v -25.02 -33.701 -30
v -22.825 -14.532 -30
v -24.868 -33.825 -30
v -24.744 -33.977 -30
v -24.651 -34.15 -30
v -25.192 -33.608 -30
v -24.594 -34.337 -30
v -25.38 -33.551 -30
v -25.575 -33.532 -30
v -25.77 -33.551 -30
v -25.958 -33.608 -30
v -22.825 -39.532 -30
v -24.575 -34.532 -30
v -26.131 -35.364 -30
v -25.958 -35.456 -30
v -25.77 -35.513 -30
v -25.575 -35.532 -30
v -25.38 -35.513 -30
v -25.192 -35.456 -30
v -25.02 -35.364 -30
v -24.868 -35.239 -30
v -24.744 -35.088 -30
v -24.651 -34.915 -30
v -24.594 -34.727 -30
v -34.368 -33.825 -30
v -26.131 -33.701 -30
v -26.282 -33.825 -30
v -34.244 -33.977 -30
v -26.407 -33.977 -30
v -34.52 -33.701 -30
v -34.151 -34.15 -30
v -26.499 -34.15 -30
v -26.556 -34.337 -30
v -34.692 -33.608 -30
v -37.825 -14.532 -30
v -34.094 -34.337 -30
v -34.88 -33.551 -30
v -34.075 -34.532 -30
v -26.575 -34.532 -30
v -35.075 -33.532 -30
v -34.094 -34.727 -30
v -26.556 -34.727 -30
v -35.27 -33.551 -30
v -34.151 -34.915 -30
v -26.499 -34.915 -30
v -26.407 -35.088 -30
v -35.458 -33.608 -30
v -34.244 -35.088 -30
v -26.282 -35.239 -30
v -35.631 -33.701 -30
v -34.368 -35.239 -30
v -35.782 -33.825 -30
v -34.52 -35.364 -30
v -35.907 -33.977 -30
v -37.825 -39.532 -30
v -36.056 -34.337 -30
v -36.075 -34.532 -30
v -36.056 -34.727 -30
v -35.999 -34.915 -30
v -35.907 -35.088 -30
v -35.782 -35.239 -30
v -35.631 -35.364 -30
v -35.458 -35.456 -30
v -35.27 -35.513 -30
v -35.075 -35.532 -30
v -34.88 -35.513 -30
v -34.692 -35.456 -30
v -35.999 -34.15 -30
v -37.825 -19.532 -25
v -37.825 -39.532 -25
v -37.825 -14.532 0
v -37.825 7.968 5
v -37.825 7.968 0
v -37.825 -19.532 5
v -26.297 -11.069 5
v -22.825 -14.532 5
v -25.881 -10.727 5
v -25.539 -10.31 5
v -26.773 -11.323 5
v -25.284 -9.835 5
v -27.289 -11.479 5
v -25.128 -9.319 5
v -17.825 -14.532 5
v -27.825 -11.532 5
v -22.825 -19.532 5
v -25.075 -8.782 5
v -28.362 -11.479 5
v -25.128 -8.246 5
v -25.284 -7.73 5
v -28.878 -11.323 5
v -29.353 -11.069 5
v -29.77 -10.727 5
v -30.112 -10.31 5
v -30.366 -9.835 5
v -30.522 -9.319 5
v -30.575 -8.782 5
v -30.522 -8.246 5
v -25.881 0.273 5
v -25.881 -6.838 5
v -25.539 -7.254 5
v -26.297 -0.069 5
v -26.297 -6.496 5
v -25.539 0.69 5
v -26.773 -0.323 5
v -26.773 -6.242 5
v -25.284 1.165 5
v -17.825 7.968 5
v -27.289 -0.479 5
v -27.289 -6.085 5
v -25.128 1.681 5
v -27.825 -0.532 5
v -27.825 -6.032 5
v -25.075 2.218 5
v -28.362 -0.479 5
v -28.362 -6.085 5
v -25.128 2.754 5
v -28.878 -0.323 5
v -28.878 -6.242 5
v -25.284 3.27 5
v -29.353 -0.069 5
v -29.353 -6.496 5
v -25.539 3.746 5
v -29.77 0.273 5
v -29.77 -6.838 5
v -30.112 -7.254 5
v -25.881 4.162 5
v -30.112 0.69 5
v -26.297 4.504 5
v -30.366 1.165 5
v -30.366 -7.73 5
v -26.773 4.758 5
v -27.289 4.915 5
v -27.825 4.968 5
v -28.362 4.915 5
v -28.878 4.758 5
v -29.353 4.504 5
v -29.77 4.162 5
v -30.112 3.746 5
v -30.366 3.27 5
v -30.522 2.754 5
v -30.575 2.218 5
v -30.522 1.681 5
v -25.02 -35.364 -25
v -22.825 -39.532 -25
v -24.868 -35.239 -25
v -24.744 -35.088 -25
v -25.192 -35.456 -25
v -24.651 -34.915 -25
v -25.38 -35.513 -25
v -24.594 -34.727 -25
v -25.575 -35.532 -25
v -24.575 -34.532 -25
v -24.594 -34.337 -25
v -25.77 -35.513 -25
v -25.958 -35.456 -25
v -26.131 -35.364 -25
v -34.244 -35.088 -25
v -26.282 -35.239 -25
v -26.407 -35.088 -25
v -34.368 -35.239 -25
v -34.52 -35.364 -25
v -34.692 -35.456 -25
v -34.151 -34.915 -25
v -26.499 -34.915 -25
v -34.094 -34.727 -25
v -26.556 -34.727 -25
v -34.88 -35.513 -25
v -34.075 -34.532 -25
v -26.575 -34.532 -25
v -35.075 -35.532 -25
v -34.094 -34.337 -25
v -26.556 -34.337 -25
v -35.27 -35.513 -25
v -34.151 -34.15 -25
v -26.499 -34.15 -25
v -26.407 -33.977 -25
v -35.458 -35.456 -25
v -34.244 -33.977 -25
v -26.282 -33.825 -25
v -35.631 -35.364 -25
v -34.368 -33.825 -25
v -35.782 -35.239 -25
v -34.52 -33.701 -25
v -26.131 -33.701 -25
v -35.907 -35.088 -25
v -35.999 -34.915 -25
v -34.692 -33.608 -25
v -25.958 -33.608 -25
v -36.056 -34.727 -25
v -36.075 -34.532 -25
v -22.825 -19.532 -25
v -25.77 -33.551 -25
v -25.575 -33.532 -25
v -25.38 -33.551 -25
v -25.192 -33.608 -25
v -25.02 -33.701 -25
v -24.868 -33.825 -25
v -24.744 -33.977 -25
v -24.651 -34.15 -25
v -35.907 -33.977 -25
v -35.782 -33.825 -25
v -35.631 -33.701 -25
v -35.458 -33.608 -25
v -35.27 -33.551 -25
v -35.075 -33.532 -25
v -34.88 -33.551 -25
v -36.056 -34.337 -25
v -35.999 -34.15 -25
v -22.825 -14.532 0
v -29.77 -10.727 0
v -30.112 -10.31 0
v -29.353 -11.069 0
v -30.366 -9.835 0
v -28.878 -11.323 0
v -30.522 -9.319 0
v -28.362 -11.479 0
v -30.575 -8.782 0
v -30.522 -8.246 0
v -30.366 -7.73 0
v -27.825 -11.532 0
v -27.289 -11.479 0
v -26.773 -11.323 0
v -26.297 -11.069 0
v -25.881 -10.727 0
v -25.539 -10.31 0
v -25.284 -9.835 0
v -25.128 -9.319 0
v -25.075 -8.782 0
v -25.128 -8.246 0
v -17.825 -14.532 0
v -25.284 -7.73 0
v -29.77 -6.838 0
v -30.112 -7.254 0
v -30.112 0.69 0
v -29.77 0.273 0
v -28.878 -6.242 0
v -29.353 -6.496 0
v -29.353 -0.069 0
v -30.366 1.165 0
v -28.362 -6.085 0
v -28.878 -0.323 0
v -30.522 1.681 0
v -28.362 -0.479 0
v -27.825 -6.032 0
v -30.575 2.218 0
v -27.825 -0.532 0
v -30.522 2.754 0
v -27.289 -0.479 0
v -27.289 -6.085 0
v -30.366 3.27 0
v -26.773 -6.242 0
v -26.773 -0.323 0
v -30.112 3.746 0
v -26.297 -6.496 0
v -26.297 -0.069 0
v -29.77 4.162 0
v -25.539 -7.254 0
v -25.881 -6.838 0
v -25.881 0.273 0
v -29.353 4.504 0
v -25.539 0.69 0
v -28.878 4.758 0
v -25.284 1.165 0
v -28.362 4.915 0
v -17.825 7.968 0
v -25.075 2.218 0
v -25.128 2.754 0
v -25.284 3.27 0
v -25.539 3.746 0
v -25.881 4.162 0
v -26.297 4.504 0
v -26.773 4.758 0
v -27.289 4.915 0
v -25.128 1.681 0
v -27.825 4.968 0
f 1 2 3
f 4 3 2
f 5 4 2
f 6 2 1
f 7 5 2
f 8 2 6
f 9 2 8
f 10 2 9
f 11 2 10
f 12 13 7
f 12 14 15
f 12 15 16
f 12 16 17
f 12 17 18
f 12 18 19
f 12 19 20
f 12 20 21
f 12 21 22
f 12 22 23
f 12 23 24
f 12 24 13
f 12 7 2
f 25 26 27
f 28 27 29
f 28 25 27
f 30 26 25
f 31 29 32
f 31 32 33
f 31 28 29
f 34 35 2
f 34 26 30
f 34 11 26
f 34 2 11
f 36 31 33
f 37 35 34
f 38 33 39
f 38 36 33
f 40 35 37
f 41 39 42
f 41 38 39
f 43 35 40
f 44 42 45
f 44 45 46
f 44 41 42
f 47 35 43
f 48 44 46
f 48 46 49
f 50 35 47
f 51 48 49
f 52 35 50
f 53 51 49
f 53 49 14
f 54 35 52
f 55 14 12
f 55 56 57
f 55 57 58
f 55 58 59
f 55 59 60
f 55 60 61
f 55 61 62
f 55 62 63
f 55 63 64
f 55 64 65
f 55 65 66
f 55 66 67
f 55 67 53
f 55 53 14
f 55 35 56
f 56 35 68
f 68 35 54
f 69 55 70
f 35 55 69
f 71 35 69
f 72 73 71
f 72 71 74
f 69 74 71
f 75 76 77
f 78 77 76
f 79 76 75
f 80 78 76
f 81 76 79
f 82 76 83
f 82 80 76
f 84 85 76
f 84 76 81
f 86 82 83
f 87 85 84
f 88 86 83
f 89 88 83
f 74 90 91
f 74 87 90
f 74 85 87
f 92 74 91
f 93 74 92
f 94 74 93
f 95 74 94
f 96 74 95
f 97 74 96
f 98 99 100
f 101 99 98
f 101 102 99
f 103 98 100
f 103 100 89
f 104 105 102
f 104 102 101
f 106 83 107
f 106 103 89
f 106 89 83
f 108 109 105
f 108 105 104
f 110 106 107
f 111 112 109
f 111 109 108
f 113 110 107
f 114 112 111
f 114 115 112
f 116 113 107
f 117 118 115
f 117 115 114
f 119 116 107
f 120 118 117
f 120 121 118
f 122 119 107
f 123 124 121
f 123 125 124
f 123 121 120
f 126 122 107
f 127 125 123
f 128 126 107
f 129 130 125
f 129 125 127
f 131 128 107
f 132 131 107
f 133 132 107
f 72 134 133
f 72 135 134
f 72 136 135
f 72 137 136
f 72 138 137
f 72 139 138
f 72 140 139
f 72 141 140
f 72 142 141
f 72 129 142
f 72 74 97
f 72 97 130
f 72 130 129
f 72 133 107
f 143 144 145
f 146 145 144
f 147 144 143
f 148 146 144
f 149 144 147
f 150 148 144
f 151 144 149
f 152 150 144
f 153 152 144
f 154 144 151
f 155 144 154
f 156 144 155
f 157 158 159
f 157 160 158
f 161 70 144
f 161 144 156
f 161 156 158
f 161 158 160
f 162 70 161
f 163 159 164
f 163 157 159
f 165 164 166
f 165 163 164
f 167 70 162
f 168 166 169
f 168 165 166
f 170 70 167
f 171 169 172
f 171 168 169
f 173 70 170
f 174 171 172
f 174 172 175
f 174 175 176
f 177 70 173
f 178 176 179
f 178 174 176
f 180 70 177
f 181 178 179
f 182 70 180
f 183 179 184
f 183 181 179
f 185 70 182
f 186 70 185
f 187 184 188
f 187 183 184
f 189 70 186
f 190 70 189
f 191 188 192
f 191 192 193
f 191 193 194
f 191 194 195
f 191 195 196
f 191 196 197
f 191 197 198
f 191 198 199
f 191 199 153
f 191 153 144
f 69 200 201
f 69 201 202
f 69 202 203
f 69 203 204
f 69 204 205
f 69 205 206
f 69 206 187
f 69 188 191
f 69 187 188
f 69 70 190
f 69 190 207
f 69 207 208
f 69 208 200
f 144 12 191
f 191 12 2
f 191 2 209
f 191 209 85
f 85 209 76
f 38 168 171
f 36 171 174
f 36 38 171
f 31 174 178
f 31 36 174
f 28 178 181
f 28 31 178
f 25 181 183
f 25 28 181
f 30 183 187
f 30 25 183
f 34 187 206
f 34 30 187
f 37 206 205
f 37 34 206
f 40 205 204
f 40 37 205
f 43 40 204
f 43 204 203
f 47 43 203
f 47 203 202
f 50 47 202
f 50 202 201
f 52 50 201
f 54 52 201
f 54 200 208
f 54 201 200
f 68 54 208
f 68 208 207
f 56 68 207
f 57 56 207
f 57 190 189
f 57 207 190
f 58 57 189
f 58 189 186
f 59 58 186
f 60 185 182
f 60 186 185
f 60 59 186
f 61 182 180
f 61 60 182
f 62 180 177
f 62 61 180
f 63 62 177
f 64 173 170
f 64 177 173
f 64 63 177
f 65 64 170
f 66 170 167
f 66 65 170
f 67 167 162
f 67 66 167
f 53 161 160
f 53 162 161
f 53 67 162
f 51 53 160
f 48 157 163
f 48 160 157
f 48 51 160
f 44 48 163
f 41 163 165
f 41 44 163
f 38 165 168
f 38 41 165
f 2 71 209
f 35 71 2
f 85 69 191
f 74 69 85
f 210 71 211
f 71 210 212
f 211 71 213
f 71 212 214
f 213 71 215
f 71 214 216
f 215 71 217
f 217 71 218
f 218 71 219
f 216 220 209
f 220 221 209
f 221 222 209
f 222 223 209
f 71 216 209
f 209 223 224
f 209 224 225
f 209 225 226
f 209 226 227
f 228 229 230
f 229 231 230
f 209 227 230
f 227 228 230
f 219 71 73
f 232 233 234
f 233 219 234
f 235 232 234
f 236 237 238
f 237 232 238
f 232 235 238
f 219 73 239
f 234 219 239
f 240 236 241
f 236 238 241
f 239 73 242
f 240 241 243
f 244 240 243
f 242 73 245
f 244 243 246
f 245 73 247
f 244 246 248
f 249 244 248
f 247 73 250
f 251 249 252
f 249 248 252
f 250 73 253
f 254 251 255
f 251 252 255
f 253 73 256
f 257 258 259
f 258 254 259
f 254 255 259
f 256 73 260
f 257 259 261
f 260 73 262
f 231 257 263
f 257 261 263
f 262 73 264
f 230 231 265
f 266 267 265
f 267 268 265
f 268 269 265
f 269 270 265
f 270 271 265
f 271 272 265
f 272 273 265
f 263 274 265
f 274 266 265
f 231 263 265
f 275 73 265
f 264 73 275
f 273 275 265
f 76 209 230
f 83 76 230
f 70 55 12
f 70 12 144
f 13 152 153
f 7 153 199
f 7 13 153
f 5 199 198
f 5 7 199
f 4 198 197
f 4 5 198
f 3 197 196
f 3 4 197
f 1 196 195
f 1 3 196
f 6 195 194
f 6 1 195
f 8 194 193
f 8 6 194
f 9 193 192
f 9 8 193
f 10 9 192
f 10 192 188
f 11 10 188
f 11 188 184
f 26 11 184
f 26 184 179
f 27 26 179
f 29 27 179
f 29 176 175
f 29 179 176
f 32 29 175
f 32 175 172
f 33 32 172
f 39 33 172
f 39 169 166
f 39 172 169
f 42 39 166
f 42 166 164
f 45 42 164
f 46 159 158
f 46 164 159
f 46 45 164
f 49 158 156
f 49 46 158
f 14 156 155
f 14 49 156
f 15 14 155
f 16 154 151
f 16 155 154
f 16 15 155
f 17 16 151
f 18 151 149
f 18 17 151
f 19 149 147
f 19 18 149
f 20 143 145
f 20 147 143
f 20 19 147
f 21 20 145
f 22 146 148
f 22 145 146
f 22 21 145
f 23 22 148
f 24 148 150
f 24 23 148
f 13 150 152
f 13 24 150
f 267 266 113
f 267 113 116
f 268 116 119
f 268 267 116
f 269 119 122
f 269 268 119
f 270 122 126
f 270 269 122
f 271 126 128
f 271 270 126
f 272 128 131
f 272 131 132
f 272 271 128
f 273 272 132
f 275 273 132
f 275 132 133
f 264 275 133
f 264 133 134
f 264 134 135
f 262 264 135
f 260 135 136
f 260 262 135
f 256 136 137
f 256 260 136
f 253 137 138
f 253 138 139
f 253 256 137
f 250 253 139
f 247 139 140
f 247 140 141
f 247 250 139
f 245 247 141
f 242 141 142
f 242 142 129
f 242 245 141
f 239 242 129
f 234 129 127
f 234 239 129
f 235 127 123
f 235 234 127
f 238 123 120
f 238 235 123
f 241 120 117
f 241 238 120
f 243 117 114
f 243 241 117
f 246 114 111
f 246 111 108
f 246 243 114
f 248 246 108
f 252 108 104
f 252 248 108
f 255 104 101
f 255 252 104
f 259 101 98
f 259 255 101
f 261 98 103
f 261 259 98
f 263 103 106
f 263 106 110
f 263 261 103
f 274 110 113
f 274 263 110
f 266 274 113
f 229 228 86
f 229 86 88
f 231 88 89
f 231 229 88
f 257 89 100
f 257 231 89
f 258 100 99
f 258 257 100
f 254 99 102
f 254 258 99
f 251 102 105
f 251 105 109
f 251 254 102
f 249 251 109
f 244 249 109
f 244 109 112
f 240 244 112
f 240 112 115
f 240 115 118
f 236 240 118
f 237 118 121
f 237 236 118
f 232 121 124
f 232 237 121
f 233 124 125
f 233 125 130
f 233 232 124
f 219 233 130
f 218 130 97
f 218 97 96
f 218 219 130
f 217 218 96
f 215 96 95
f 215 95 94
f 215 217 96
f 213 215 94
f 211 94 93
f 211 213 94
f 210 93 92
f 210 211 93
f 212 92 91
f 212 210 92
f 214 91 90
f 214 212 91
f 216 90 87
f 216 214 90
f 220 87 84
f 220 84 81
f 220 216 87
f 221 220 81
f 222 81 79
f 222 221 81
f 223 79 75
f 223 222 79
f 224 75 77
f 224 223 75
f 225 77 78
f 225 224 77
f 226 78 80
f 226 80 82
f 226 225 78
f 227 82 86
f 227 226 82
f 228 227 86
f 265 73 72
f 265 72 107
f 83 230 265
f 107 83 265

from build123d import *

# Parameters (mm, degrees)
ESQUISSE1_W             = 20
ESQUISSE1_H             = 22.5
ESQUISSE1_R             = 2.75
BOSS_EXTRU_1_DEPTH      = 5
BOSS_EXTRU_2_DEPTH      = 15
ENL_V_MAT_EXTRU_1_REACH = 66.95
ESQUISSE3_R             = 1


with BuildPart() as part:
    # Esquisse1 → Boss.-Extru.1 (new body)
    with BuildSketch(Plane.XY):
        with Locations((-27.825146679, -3.282272289)):
            Rectangle(ESQUISSE1_W, ESQUISSE1_H)
        with Locations((-27.825146679, 2.217727711)):
            Circle(ESQUISSE1_R, mode=Mode.SUBTRACT)
        with Locations((-27.825146679, -8.782272289)):
            Circle(ESQUISSE1_R, mode=Mode.SUBTRACT)
    extrude(amount=BOSS_EXTRU_1_DEPTH)

    # Esquisse4 → Boss.-Extru.2 (add)
    with BuildSketch(Plane.ZY.offset(37.825146679)):
        Polygon((5, -14.532272289), (-30, -14.532272289), (-30, -39.532272289), (-25, -39.532272289), (-25, -19.532272289), (5, -19.532272289), align=None)
    extrude(amount=-BOSS_EXTRU_2_DEPTH)

    # Esquisse3 → Enlèv. mat.-Extru.1 (cut, up to next)
    with BuildSketch(Plane.XY.offset(-30), mode=Mode.PRIVATE) as enl_v_mat_extru_1_sk1:
        with Locations((-25.575146679, -34.532272289)):
            Circle(ESQUISSE3_R)
    enl_v_mat_extru_1_tool1 = extrude(enl_v_mat_extru_1_sk1.sketch, amount=ENL_V_MAT_EXTRU_1_REACH, mode=Mode.PRIVATE) & part.part
    # Esquisse3 → Enlèv. mat.-Extru.1 (cut, up to next)
    with BuildSketch(Plane.XY.offset(-30), mode=Mode.PRIVATE) as enl_v_mat_extru_1_sk2:
        with Locations((-35.075146679, -34.532272289)):
            Circle(ESQUISSE3_R)
    enl_v_mat_extru_1_tool2 = extrude(enl_v_mat_extru_1_sk2.sketch, amount=ENL_V_MAT_EXTRU_1_REACH, mode=Mode.PRIVATE) & part.part
    add(enl_v_mat_extru_1_tool1.solids().sort_by_distance((-25.575147, -34.532272, -30))[0], mode=Mode.SUBTRACT)
    add(enl_v_mat_extru_1_tool2.solids().sort_by_distance((-35.075147, -34.532272, -30))[0], mode=Mode.SUBTRACT)


solid = part.part
